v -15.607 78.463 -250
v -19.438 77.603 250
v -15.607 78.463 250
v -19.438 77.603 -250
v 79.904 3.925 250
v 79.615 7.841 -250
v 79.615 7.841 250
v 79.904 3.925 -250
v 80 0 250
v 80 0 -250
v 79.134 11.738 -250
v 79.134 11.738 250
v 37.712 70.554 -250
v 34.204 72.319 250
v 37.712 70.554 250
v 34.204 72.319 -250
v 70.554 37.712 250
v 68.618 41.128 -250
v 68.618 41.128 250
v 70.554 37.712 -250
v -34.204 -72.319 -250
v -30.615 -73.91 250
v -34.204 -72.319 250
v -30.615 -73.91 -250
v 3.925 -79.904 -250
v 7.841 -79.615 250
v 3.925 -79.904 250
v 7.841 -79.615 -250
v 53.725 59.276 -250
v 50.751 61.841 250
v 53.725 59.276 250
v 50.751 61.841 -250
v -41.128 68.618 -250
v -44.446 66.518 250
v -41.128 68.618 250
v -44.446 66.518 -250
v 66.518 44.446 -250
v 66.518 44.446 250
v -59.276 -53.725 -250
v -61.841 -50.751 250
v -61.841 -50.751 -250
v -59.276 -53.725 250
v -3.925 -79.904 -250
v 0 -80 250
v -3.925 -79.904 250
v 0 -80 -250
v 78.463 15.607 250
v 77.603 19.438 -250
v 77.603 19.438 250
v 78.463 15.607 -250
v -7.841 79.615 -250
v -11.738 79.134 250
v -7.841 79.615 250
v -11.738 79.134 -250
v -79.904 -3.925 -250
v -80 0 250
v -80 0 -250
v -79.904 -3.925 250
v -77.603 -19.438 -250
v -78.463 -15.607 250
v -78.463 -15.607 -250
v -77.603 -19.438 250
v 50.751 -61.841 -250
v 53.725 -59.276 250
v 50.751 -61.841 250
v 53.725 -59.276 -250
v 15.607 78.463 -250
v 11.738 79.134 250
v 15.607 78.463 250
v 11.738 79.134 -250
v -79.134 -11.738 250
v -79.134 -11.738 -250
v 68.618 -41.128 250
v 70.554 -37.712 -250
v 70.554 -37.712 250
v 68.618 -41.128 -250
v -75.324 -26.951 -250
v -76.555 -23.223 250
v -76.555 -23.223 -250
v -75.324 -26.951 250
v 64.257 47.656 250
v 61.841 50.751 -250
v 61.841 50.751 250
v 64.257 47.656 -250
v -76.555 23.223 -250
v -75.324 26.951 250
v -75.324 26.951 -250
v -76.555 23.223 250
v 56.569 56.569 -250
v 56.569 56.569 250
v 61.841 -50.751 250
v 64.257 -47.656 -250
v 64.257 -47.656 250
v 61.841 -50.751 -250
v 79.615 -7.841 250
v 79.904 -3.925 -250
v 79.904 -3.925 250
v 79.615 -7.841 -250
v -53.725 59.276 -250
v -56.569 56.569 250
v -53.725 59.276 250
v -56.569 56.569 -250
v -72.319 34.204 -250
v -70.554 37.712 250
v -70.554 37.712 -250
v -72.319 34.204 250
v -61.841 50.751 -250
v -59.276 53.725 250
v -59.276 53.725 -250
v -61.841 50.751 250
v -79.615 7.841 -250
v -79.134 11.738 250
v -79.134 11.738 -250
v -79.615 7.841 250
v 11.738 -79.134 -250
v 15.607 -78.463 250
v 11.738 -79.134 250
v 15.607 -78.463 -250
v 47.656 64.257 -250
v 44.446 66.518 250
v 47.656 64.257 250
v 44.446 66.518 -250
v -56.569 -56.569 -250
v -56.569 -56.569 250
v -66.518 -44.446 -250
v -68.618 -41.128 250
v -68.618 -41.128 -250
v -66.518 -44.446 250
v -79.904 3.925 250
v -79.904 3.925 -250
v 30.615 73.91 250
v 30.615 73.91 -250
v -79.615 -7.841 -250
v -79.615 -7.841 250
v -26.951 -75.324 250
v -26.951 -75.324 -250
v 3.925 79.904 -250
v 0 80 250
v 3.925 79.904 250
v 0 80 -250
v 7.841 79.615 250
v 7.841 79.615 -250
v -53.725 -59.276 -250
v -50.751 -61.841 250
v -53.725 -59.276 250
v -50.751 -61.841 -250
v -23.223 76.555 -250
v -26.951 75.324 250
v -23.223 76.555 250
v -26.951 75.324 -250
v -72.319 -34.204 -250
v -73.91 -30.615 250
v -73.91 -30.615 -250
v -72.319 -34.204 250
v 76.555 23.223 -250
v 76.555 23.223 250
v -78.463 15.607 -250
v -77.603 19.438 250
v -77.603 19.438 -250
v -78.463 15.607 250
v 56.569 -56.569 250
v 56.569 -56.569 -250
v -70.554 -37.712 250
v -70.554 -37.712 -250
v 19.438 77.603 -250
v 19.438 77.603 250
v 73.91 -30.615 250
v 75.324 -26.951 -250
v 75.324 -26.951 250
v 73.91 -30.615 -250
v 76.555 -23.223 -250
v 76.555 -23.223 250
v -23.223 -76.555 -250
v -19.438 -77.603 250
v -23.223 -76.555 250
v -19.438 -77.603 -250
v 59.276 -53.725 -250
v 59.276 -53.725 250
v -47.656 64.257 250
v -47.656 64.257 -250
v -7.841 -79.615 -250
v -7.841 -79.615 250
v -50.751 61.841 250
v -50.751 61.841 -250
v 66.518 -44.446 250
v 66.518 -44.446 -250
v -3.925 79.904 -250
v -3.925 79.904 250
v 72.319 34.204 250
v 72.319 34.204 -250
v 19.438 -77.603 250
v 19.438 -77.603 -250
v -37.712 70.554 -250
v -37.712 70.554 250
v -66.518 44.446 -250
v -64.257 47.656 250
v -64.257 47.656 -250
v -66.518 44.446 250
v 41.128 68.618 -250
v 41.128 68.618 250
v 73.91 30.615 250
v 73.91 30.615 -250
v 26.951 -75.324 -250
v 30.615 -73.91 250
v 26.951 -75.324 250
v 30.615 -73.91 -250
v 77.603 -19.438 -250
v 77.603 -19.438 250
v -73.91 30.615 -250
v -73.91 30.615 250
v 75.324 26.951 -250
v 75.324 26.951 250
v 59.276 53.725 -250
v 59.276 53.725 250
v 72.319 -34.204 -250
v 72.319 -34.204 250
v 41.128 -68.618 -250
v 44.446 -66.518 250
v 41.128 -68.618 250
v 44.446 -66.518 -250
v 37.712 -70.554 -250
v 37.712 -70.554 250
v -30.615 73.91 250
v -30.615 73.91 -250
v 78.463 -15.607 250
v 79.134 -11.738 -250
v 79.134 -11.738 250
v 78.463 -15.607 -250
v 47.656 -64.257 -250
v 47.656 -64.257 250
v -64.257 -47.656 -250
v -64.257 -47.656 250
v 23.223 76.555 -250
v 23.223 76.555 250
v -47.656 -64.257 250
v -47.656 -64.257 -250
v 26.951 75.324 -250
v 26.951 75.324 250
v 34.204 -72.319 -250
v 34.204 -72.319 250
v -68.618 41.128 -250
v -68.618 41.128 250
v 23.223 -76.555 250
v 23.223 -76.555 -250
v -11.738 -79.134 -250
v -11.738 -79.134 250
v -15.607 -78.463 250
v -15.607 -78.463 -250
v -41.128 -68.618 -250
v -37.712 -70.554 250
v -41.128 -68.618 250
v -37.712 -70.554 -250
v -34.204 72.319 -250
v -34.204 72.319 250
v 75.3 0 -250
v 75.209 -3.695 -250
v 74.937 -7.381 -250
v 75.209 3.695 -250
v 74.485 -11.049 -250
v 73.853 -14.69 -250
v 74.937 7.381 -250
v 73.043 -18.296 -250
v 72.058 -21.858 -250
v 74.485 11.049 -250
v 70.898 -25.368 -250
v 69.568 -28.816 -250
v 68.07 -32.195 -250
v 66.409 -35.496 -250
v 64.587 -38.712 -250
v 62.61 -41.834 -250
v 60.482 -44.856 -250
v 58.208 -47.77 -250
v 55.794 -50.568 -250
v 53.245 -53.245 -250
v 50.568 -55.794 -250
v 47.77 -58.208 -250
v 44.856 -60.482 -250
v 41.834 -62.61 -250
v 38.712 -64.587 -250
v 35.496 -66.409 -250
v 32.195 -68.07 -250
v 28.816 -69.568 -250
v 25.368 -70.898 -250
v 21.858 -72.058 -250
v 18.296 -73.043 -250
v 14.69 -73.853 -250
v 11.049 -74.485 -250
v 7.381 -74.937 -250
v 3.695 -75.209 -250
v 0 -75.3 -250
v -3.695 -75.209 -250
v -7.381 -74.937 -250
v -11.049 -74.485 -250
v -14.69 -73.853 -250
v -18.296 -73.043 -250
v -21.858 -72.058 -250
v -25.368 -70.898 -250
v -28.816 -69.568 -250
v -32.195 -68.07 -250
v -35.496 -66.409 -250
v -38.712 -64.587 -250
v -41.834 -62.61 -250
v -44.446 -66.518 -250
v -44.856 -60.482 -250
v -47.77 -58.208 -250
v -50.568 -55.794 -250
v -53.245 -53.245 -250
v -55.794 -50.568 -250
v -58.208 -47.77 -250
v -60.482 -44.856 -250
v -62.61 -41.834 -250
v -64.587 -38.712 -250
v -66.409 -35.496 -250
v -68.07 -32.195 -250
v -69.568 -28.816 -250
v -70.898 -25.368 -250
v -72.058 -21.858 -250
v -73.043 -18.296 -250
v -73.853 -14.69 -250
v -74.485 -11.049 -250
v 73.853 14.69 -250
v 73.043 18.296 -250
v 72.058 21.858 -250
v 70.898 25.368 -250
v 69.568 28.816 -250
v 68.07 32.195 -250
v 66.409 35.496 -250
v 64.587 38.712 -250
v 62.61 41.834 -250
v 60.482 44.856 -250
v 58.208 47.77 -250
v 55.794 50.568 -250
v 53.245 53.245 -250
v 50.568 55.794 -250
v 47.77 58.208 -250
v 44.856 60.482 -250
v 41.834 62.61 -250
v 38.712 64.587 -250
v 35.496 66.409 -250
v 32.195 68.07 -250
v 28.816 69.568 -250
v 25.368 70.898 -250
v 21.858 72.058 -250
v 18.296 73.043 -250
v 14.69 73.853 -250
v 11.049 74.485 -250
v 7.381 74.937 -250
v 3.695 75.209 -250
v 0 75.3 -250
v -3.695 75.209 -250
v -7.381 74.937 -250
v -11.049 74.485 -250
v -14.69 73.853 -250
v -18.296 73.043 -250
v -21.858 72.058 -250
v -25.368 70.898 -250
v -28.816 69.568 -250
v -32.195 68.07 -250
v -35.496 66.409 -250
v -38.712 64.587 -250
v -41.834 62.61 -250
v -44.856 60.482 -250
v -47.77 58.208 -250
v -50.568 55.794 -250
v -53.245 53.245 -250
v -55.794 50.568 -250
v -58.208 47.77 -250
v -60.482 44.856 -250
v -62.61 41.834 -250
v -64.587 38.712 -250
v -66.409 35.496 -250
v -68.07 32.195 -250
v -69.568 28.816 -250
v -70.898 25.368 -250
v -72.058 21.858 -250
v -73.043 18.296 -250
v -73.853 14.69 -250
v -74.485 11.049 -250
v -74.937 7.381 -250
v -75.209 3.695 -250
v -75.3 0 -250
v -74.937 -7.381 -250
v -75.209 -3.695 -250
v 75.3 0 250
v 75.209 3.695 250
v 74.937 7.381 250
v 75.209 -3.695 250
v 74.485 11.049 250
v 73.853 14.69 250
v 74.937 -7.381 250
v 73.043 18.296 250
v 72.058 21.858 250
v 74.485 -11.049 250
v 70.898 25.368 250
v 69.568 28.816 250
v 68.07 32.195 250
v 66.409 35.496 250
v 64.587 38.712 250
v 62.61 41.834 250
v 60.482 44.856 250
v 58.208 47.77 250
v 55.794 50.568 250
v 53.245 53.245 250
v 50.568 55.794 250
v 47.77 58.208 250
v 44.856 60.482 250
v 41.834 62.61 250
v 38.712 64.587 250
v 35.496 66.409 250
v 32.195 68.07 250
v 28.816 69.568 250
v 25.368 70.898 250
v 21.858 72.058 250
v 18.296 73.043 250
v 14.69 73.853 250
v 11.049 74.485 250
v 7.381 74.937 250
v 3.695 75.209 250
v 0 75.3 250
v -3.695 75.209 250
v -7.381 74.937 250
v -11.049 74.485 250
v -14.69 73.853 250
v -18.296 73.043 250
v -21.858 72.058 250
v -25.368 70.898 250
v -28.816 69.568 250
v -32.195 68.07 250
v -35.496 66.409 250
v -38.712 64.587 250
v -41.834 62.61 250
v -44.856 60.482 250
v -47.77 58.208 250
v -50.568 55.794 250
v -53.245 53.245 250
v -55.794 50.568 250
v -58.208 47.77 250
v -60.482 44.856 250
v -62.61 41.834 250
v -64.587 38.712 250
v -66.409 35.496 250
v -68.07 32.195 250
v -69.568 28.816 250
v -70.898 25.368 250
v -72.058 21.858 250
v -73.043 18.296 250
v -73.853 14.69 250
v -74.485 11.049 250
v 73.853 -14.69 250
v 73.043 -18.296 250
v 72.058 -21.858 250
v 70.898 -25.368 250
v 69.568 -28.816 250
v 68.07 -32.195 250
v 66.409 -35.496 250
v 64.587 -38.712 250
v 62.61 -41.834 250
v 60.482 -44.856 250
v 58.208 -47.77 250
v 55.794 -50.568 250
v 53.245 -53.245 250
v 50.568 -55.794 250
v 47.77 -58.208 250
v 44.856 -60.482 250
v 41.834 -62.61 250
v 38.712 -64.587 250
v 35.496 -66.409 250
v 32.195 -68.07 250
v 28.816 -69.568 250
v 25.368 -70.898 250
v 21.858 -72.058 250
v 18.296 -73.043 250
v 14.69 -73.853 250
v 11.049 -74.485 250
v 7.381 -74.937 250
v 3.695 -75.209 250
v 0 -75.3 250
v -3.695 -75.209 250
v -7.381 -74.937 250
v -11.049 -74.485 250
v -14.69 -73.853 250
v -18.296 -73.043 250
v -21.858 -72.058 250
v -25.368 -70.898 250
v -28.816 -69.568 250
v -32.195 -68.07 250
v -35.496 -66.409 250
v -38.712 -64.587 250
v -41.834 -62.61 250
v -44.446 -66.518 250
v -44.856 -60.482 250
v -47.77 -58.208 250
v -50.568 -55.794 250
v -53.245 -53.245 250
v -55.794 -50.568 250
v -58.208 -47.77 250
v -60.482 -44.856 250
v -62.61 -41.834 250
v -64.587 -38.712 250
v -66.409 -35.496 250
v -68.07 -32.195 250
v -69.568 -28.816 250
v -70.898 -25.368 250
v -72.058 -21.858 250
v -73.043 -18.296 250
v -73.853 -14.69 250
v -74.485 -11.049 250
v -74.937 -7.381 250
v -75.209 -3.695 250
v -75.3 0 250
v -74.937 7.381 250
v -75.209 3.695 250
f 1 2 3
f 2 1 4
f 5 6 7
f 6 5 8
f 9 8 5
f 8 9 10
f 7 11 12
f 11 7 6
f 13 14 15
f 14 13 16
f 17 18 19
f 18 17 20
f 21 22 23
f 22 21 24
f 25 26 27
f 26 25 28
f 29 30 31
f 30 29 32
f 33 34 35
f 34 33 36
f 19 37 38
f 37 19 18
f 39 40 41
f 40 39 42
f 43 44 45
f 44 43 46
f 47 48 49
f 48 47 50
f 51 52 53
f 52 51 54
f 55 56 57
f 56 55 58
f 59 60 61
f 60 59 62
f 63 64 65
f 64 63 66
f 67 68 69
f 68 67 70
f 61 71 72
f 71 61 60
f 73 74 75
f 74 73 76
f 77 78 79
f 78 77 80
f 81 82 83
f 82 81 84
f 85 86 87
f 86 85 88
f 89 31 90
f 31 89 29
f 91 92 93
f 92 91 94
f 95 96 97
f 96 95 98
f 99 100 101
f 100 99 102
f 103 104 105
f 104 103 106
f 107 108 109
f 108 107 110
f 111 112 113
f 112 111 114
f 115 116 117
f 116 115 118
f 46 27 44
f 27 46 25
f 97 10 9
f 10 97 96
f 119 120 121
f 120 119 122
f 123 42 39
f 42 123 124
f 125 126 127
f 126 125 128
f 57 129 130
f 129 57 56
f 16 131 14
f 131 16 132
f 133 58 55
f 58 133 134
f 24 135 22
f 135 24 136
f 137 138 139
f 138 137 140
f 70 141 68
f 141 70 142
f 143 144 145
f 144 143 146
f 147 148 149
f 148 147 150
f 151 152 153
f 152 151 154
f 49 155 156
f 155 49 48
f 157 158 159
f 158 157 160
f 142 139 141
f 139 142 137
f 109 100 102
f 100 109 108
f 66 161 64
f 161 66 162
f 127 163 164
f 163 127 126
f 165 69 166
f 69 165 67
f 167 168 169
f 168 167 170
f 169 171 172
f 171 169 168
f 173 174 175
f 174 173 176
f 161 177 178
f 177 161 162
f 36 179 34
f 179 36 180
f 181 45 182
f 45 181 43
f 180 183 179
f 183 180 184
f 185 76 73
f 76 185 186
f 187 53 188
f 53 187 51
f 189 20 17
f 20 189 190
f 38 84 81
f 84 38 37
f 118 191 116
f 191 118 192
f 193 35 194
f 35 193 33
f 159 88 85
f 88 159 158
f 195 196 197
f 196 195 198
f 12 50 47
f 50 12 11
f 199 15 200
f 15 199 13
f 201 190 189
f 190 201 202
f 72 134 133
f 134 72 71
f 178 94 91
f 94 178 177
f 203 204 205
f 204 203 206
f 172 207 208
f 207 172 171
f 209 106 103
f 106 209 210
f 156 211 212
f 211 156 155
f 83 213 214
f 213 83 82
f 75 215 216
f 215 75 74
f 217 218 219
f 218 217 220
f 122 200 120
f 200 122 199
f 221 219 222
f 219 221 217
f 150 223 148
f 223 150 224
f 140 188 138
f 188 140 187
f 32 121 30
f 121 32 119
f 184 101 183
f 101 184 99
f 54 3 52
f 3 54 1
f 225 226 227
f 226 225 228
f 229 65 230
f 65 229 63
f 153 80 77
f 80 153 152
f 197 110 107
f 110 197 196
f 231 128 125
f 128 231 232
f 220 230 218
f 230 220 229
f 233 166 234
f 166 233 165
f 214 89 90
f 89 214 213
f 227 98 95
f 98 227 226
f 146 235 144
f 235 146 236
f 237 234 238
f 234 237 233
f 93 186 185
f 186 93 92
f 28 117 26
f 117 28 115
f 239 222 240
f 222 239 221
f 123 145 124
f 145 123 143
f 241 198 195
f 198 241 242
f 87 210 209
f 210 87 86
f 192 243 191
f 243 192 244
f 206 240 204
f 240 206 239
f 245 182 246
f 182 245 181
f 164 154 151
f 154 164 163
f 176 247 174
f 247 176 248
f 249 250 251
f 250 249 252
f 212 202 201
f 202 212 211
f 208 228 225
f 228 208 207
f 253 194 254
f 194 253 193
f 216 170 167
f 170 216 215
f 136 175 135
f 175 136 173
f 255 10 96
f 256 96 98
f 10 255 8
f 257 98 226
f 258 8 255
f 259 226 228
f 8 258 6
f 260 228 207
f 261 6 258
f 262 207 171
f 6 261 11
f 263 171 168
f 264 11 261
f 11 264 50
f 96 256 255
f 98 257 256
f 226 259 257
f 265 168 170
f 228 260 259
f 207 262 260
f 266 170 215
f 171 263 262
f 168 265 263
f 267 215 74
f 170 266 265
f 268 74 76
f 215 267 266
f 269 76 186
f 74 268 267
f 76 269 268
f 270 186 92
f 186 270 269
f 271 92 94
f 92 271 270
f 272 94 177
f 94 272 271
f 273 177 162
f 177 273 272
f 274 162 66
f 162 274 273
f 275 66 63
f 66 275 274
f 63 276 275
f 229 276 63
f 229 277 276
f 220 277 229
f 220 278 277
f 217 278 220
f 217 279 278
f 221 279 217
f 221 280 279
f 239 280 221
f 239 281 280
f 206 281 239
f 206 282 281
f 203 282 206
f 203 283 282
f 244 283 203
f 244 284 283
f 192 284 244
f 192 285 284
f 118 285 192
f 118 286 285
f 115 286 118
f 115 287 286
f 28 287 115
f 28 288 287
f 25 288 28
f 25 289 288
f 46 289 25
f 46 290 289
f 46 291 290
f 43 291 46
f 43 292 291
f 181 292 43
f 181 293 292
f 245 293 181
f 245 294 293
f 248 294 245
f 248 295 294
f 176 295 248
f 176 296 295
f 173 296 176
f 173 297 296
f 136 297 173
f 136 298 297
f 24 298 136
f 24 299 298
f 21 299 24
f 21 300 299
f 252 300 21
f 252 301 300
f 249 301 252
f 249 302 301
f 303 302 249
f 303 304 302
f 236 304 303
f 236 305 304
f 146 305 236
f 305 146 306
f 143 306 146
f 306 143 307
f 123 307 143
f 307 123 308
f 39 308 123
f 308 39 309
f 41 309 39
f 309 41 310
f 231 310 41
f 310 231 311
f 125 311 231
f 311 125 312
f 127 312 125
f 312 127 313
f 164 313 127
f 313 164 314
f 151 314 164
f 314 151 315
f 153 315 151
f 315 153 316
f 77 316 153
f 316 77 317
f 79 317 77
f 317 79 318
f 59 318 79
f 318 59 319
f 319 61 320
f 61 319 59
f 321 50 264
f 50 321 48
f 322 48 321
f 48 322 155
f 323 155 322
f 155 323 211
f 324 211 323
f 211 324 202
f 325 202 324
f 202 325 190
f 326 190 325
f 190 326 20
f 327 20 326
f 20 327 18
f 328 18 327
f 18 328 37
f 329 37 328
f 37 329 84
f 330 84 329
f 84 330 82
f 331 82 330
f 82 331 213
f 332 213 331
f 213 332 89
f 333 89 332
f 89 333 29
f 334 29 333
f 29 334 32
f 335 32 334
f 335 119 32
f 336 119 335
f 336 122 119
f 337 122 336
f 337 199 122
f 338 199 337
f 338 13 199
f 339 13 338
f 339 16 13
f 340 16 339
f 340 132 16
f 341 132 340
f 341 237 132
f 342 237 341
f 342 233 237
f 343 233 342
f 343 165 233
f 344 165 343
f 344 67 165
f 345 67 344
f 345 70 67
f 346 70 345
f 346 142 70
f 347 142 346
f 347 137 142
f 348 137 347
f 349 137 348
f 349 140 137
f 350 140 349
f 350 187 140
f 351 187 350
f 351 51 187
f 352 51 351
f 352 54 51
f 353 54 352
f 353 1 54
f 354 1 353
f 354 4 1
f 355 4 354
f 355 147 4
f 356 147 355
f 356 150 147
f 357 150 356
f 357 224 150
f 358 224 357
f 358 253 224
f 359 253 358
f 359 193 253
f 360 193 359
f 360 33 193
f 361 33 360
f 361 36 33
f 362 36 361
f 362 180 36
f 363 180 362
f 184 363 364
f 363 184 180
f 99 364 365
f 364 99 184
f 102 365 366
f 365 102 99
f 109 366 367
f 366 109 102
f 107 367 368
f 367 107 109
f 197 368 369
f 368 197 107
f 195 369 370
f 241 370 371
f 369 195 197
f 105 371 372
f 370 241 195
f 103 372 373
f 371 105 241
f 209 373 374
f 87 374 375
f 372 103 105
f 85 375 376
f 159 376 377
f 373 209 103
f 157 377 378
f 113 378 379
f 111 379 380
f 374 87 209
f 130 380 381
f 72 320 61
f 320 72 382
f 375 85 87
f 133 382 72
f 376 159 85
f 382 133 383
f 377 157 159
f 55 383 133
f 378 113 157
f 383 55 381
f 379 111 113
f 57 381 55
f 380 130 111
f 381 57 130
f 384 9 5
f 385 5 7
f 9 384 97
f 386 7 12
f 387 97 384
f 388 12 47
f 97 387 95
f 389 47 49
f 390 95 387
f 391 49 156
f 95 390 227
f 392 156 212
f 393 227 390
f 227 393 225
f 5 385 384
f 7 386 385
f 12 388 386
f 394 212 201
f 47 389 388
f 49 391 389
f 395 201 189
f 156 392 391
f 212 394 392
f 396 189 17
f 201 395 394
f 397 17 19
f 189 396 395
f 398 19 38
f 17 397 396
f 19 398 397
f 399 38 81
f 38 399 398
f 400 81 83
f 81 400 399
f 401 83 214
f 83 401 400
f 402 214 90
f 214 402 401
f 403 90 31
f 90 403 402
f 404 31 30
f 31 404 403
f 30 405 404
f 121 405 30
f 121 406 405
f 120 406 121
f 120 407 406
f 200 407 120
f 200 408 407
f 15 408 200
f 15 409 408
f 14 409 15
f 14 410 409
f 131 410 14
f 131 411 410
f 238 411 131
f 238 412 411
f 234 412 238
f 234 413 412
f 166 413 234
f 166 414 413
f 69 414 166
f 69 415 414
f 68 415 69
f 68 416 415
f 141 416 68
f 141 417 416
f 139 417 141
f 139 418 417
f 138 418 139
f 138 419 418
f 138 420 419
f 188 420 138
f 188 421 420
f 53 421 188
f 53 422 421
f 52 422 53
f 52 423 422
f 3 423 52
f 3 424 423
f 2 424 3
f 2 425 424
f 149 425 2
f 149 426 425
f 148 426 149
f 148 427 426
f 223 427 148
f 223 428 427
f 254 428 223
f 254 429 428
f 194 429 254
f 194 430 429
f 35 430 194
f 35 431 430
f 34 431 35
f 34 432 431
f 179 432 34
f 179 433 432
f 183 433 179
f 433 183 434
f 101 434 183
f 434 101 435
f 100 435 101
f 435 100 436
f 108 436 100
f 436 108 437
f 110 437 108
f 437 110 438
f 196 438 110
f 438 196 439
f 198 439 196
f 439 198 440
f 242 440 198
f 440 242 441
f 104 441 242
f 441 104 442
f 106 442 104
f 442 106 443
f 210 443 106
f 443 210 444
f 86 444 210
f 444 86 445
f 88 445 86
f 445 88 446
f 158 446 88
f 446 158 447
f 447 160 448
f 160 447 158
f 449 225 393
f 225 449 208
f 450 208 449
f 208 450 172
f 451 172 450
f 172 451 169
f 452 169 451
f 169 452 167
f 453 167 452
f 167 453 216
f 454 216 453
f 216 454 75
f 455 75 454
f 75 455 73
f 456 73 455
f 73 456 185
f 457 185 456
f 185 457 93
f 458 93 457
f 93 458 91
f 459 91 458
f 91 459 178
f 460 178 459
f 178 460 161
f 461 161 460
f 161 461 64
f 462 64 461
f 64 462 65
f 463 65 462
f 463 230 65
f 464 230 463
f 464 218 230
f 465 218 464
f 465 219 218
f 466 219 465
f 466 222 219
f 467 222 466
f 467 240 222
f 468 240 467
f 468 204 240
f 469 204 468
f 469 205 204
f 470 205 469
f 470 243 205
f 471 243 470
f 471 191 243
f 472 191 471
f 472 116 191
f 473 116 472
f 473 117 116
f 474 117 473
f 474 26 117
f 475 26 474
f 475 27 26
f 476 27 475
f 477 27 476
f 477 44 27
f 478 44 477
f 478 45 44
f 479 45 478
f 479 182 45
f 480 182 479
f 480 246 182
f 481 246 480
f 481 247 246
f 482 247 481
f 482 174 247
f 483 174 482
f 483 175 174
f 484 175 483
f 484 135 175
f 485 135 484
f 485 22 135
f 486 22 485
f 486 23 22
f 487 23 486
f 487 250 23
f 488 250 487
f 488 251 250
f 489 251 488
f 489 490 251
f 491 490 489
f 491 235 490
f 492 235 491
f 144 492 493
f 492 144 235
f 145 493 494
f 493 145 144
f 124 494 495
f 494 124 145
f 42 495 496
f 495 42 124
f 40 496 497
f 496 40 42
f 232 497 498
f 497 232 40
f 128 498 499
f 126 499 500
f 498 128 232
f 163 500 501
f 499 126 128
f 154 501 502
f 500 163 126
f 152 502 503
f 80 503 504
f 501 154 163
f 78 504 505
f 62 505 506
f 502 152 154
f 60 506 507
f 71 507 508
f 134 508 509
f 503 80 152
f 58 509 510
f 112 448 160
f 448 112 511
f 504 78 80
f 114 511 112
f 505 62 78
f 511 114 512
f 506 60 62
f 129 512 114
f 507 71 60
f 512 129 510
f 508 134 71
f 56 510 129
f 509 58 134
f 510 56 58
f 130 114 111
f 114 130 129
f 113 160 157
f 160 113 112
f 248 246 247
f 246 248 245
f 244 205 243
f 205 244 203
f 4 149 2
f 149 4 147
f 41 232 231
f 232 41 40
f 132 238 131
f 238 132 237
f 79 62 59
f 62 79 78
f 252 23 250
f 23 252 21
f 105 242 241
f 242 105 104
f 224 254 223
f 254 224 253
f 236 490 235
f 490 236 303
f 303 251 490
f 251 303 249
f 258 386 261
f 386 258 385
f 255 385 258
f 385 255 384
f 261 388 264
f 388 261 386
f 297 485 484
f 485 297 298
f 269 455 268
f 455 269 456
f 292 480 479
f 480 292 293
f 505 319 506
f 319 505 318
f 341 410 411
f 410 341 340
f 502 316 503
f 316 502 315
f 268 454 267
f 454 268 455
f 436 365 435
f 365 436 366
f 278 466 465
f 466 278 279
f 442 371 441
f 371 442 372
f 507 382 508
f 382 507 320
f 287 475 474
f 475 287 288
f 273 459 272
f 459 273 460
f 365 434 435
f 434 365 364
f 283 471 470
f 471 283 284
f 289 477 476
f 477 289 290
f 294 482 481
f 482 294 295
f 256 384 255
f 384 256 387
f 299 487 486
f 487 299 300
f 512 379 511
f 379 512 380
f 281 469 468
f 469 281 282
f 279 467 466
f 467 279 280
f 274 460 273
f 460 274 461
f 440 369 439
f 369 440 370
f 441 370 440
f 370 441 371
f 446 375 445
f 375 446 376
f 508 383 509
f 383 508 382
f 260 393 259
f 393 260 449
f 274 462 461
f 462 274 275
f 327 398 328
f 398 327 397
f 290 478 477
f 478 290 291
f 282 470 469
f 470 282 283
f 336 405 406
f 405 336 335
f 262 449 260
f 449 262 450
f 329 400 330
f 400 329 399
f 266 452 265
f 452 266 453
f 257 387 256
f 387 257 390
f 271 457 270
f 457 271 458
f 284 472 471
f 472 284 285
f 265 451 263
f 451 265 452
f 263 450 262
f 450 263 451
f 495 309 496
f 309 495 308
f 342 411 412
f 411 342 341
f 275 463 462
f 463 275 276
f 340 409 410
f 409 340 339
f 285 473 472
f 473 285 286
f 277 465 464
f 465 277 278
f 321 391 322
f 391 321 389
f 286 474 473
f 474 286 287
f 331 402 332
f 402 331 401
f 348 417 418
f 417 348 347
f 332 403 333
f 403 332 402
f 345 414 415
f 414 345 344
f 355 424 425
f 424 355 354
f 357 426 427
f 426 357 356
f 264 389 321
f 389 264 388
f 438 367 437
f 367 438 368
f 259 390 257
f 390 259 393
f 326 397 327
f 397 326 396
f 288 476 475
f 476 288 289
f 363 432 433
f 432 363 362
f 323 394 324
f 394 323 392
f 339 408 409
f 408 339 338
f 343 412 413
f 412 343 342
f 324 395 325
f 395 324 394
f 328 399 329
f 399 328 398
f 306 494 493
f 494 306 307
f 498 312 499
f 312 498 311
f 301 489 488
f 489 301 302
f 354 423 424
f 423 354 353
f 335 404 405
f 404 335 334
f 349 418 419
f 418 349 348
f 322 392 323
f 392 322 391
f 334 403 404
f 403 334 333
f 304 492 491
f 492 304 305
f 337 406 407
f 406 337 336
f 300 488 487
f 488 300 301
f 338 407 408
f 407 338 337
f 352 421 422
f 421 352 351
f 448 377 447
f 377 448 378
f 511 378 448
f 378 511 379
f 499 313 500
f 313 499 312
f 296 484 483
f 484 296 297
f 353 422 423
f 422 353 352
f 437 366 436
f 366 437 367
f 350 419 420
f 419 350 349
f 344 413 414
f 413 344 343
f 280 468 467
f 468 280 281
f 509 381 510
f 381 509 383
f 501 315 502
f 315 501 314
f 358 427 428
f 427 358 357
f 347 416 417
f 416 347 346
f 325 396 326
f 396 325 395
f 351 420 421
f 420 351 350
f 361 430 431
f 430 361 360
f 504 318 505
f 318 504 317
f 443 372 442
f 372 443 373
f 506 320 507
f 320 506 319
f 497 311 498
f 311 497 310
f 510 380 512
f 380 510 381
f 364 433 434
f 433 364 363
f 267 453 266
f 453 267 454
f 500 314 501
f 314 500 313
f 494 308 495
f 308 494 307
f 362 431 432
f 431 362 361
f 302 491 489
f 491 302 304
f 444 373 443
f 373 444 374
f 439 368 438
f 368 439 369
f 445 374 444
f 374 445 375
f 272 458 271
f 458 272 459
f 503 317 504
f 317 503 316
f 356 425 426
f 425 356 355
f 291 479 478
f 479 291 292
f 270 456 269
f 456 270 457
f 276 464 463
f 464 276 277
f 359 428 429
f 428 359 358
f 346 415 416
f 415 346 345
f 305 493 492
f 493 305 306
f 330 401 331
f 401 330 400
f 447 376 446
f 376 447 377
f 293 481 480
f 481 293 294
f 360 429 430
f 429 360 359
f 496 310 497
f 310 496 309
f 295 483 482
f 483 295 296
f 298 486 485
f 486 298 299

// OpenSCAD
$fn=128;

module ht_pipe(od=160, length=500, wall=4.7) {
    difference() {
        cylinder(h=length, d=od, center=true);
        cylinder(h=length+2, d=od-2*wall, center=true);
    }
}

ht_pipe(od=160, length=500, wall=4.7);
